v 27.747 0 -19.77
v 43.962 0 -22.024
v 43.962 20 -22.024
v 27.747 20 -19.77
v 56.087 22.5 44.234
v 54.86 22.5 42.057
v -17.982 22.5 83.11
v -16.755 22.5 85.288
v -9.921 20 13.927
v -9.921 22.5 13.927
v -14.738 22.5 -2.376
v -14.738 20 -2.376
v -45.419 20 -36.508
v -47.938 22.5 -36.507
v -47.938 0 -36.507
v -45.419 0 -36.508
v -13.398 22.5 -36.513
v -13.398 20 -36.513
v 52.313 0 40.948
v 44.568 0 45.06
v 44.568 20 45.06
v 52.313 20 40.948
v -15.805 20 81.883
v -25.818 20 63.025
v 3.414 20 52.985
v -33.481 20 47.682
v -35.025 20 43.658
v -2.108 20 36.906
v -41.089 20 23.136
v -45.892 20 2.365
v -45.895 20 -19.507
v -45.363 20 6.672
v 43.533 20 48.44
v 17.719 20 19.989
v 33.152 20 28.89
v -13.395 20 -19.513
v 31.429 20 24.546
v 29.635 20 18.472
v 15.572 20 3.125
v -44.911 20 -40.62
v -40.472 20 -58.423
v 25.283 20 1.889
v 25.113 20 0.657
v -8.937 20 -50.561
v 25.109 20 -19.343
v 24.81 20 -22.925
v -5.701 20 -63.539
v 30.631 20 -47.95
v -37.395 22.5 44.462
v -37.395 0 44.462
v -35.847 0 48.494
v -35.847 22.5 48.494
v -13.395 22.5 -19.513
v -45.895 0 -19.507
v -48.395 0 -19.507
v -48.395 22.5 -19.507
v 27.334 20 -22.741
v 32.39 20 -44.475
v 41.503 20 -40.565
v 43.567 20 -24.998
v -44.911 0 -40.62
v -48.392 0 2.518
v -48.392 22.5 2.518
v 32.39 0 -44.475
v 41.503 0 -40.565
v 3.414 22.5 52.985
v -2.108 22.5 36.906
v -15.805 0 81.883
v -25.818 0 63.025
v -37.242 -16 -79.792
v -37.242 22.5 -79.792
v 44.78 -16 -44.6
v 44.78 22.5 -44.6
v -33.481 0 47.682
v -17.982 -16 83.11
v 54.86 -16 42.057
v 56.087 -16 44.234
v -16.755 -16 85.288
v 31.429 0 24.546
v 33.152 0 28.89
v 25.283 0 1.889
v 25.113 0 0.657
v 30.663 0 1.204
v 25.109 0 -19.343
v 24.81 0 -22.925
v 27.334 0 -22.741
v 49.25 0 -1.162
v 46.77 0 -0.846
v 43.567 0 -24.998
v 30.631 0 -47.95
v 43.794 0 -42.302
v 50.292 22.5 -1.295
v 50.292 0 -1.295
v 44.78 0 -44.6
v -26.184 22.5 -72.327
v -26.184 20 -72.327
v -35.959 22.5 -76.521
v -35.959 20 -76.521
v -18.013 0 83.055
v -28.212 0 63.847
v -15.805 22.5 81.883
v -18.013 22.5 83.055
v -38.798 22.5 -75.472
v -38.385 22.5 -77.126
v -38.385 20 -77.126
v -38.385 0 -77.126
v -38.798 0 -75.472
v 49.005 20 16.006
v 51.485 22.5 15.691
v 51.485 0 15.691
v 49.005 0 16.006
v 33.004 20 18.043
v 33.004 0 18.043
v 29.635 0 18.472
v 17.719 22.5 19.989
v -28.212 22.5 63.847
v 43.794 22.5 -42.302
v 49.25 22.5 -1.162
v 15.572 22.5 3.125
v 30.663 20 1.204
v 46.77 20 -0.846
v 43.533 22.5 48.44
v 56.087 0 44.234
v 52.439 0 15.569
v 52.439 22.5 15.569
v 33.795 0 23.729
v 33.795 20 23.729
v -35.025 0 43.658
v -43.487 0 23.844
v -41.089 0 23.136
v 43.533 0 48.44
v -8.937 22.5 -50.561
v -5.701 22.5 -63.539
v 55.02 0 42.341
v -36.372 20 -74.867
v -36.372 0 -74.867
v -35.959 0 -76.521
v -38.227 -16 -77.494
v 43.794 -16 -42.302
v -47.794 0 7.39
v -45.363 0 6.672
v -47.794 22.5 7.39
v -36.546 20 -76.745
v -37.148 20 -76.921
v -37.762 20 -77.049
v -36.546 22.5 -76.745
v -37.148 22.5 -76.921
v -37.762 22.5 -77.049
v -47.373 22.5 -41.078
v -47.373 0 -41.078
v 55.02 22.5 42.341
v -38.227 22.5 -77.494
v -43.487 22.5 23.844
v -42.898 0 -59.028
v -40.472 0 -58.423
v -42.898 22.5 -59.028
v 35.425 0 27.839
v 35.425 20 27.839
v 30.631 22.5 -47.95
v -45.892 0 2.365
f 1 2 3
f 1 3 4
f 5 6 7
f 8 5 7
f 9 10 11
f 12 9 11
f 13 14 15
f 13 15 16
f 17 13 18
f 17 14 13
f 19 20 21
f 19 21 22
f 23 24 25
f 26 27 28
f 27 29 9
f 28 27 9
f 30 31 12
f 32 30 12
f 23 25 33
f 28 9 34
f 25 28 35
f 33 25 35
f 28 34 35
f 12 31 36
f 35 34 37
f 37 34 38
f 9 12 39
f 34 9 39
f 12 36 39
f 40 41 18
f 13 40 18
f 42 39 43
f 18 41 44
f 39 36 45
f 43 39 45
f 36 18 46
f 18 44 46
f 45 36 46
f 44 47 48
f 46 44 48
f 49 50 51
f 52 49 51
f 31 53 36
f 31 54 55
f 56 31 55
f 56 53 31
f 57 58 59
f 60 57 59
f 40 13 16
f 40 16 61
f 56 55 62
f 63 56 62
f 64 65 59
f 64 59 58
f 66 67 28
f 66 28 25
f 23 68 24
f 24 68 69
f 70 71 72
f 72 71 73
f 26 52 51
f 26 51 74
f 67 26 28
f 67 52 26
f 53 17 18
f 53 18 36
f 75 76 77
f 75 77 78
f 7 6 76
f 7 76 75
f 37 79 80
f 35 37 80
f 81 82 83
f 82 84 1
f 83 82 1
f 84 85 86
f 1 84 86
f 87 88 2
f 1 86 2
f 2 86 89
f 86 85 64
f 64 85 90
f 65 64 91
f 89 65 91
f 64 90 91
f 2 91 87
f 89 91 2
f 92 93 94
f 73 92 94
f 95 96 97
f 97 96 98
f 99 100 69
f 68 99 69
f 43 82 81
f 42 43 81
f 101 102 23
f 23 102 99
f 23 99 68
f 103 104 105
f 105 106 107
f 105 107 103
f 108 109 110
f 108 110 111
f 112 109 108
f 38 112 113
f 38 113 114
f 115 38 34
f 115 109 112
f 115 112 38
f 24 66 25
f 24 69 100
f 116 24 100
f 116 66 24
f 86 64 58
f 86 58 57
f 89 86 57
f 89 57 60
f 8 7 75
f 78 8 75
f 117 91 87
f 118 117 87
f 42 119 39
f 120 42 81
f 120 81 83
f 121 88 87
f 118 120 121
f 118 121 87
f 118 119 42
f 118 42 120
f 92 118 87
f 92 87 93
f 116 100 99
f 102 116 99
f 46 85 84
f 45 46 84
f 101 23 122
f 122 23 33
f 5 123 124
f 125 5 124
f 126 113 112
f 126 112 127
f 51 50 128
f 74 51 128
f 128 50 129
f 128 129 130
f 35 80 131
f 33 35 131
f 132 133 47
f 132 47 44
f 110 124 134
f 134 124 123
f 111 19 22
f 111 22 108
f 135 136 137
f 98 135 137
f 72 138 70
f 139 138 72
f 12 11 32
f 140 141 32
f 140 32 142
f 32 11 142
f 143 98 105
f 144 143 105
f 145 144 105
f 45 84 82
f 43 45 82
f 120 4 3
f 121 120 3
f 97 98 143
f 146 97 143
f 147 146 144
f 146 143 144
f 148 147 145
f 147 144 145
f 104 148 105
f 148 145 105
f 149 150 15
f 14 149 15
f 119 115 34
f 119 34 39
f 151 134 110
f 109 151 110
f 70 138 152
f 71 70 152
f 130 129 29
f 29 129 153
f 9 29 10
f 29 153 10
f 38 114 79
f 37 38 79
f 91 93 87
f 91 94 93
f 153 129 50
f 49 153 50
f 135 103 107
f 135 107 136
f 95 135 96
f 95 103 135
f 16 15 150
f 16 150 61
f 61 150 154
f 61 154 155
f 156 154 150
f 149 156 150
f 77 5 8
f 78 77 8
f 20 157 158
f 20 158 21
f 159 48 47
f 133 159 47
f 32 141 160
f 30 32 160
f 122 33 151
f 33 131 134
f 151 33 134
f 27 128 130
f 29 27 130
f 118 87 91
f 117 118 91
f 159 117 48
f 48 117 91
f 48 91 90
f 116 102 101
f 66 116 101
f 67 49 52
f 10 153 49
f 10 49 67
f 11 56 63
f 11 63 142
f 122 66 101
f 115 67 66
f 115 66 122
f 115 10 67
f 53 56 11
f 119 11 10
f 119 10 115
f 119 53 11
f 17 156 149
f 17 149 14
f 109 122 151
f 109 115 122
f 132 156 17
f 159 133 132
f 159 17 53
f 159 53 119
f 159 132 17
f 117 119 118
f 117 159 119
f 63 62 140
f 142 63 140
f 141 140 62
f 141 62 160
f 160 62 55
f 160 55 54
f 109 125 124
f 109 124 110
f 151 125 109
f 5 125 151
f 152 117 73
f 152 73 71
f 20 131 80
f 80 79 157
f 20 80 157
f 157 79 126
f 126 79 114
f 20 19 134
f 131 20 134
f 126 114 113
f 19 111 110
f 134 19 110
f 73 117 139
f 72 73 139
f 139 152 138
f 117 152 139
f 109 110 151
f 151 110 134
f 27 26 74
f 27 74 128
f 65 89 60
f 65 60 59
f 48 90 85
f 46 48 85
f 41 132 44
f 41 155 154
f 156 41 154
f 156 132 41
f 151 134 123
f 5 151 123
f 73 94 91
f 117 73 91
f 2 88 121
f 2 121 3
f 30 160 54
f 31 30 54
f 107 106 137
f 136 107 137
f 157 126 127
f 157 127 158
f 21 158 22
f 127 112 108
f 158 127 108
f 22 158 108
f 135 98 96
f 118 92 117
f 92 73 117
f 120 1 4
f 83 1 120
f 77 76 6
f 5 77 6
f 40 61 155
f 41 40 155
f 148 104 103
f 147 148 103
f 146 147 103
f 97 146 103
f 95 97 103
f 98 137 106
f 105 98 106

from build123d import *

# Parameters (mm, degrees)
BOSS_EXTRUDE1_DEPTH   = 20
BOSS_EXTRUDE1_2_DEPTH = 20
BOSS_EXTRUDE3_DEPTH   = 2.5
BOSS_EXTRUDE5_DEPTH   = 2.5
BOSS_EXTRUDE7_DEPTH   = 2.5
BOSS_EXTRUDE9_DEPTH   = 22.5
CUT_EXTRUDE1_DEPTH    = 35
CUT_EXTRUDE3_DEPTH    = 35
CUT_EXTRUDE5_DEPTH    = 35
CUT_EXTRUDE7_DEPTH    = 35
CUT_EXTRUDE8_DEPTH    = 35


with BuildPart() as part:
    # Sketch1 → Boss-Extrude1 (new body)
    with BuildSketch(Plane(origin=(0, 0, 0), x_dir=(1, 0, 0), z_dir=(0, 1, 0))):
        Polygon((33.151826981, -28.889539813), (43.532853036, -48.440295537), (55.01986224, -42.340943495), (43.794416361, 42.302390906), (30.631369723, 47.950055803), (24.810262555, 22.924594248), (25.109476408, 19.342716652), (25.112763078, -0.657283348), (25.762252215, -5.365269223), (31.429425892, -24.545549266), align=None)
        Polygon((32.389830977, 44.475185063), (27.334304705, 22.741024409), (43.567457043, 24.997907911), (41.502917609, 40.565173886), align=None, mode=Mode.SUBTRACT)
        Polygon((27.747419084, 19.769604461), (33.794993109, -23.728959096), (35.42478626, -27.839387317), (44.568470816, -45.059837607), (52.313182094, -40.947564368), (43.961873164, 22.023888357), align=None, mode=Mode.SUBTRACT)
    extrude(amount=BOSS_EXTRUDE1_DEPTH)



with BuildPart() as body_2:
    # Sketch1 → Boss-Extrude1 2 (new body)
    with BuildSketch(Plane(origin=(0, 0, 0), x_dir=(1, 0, 0), z_dir=(0, 1, 0))):
        Polygon((-35.959492242, 76.521167337), (-38.385231558, 77.125972076), (-47.373086859, 41.077653402), (-48.397629196, 32.789030369), (-48.391827101, -2.517800327), (-47.399088956, -10.603003688), (-37.394840102, -44.4619086), (-34.498049544, -52.008306004), (-18.012795707, -83.055253493), (-15.804757852, -81.882833418), (-32.218638907, -50.970303455), (-35.02538101, -43.658490296), (-44.942934944, -10.093000221), (-45.891852228, -2.364689129), (-45.897603901, 32.635310398), (-44.910602379, 40.620225465), align=None)
    extrude(amount=BOSS_EXTRUDE1_2_DEPTH)


with BuildPart() as part_1:
    add(part.part)

    add(body_2.part)  # Boss-Extrude3 merges body 2
    # Sketch5 → Boss-Extrude3 (add)
    with BuildSketch(Plane(origin=(0, 20, 0), x_dir=(1, 0, 0), z_dir=(0, 1, 0))):
        with BuildLine():
            Line((-15.804757852, -81.882833418), (43.532853036, -48.440295537))
            Line((43.532853036, -48.440295537), (55.01986224, -42.340943495))
            Line((55.01986224, -42.340943495), (43.794416361, 42.302390906))
            Line((43.794416361, 42.302390906), (30.631369723, 47.950055803))
            Line((30.631369723, 47.950055803), (-35.959492242, 76.521167337))
            ThreePointArc((-35.959492242, 76.521167337), (-37.147972825, 76.921388943), (-38.385231558, 77.125972076))
            Line((-38.385231558, 77.125972076), (-47.373086859, 41.077653402))
            Line((-47.373086859, 41.077653402), (-48.397629196, 32.789030369))
            Line((-48.397629196, 32.789030369), (-48.391827101, -2.517800327))
            Line((-48.391827101, -2.517800327), (-47.399088956, -10.603003688))
            Line((-47.399088956, -10.603003688), (-37.394840102, -44.4619086))
            Line((-37.394840102, -44.4619086), (-34.498049544, -52.008306004))
            Line((-34.498049544, -52.008306004), (-18.012795707, -83.055253493))
            Line((-18.012795707, -83.055253493), (-15.804757852, -81.882833418))
        make_face()
    extrude(amount=BOSS_EXTRUDE3_DEPTH)

    # Sketch9 → Cut-Extrude1 (cut)
    with BuildSketch(Plane(origin=(-42.82190598, 22.5, -75.462856003), x_dir=(0.9988636405139372, 0, -0.047659497051944756), z_dir=(0, 1, 0))):
        Polygon((0.746020724, -124.239988023), (35.312448522, -114.182052387), (40.062029239, -130.505087736), (5.495601441, -140.563023372), align=None)
    extrude(amount=-CUT_EXTRUDE1_DEPTH, mode=Mode.SUBTRACT)

    # Sketch11 → Cut-Extrude3 (cut)
    with BuildSketch(Plane(origin=(-42.82190598, 22.5, -75.462856003), x_dir=(0.9988636405139371, 0, -0.04765949705194475), z_dir=(0, 1, 0))):
        Polygon((-5.396966491, -99.162626381), (28.603046753, -90.856056728), (24.568427207, -74.341764581), (-9.431586037, -82.648334234), align=None)
    extrude(amount=-CUT_EXTRUDE3_DEPTH, mode=Mode.SUBTRACT)

    # Sketch13 → Cut-Extrude5 (cut)
    with BuildSketch(Plane(origin=(-42.82190598, 22.5, -75.462856003), x_dir=(0.9988636405139371, 0, -0.04765949705194475), z_dir=(0, 1, 0))):
        Polygon((-7.42661137, -38.645767828), (27.533889698, -40.308105066), (26.726468754, -57.28891987), (-8.234032314, -55.626582632), align=None)
    extrude(amount=-CUT_EXTRUDE5_DEPTH, mode=Mode.SUBTRACT)

    # Sketch15 → Cut-Extrude7 (cut)
    with BuildSketch(Plane(origin=(-42.82190598, 22.5, -75.462856003), x_dir=(0.9988636405139371, 0, -0.04765949705194475), z_dir=(0, 1, 0))):
        Polygon((4.020110973, -0.182810694), (16.469733166, -3.925390986), (36.510013001, -13.679647293), (32.65940268, -26.488629322), (-0.858810917, -16.412451614), align=None)
    extrude(amount=-CUT_EXTRUDE7_DEPTH, mode=Mode.SUBTRACT)


with BuildPart() as body_2_2:
    # Sketch6 → Boss-Extrude5 (new body)
    with BuildSketch(Plane(origin=(31.213867564, 0, 55.383246764), x_dir=(0.871166636126556, 0, -0.4909874663369126), z_dir=(0.49098746633691265, 0, 0.8711666361265561))):
        Polygon((-53.972022649, 22.5), (14.140791166, 22.5), (27.142595739, 22.5), (27.142595739, 0), (27.142595739, -16), (-56.471235122, -16), (-56.471235122, 0), (-56.471235122, 22.5), align=None)
    extrude(amount=BOSS_EXTRUDE5_DEPTH)


with BuildPart() as body_3:
    # Sketch7 → Boss-Extrude7 (new body)
    with BuildSketch(Plane(origin=(22.136914585, 0, -51.594640331), x_dir=(-0.9189842056612053, 0, -0.3942943440441967), z_dir=(0.3942943440441968, 0, -0.9189842056612054))):
        Polygon((-23.566783458, 0), (-23.566783458, 22.5), (65.685756101, 22.5), (65.685756101, 0), (65.685756101, -16), (-23.566783458, -16), align=None)
    extrude(amount=BOSS_EXTRUDE7_DEPTH)


with BuildPart() as body_4:
    # Sketch8 → Boss-Extrude9 (new body)
    with BuildSketch(Plane.XZ):
        Polygon((56.087060055, 44.234489043), (44.780152221, -44.59985142), (43.794416361, -42.302390906), (55.01986224, 42.340943495), align=None)
    extrude(amount=-BOSS_EXTRUDE9_DEPTH)


with BuildPart() as cut_extrude7_piece_1:
    # of the separate pieces the step leaves, piece 1, a body of its own (cut_extrude7_pieces)
    add(part_1.part.solids().sort_by_distance((33.151826981, 0, 28.889539813))[0])


with BuildPart() as cut_extrude7_piece_2:
    # of the separate pieces the step leaves, piece 2, a body of its own (cut_extrude7_pieces)
    add(part_1.part.solids().sort_by_distance((-36.371911317, 20, -74.867044776))[0])


with BuildPart() as cut_extrude8_tool:
    # Sketch16 → Cut-Extrude8 (new body)
    with BuildSketch(Plane(origin=(-42.82190598, 22.5, -75.462856003), x_dir=(0.9988636405139371, 0, -0.04765949705194475), z_dir=(0, 1, 0))):
        Polygon((54.582299423, -81.281151066), (89.473352578, -78.521729075), (90.81364326, -95.468812036), (55.922590105, -98.228234027), align=None)
    extrude(amount=-CUT_EXTRUDE8_DEPTH)


with BuildPart() as body_4_1:
    add(body_4.part)

    # Cut-Extrude8: cut by cut_extrude8_tool
    add(cut_extrude8_tool.part, mode=Mode.SUBTRACT)


with BuildPart() as cut_extrude7_piece_1_1:
    add(cut_extrude7_piece_1.part)

    # Cut-Extrude8: cut by cut_extrude8_tool
    add(cut_extrude8_tool.part, mode=Mode.SUBTRACT)


solid = Compound([body_2_2.part, body_3.part, cut_extrude7_piece_2.part, body_4_1.part, cut_extrude7_piece_1_1.part])
